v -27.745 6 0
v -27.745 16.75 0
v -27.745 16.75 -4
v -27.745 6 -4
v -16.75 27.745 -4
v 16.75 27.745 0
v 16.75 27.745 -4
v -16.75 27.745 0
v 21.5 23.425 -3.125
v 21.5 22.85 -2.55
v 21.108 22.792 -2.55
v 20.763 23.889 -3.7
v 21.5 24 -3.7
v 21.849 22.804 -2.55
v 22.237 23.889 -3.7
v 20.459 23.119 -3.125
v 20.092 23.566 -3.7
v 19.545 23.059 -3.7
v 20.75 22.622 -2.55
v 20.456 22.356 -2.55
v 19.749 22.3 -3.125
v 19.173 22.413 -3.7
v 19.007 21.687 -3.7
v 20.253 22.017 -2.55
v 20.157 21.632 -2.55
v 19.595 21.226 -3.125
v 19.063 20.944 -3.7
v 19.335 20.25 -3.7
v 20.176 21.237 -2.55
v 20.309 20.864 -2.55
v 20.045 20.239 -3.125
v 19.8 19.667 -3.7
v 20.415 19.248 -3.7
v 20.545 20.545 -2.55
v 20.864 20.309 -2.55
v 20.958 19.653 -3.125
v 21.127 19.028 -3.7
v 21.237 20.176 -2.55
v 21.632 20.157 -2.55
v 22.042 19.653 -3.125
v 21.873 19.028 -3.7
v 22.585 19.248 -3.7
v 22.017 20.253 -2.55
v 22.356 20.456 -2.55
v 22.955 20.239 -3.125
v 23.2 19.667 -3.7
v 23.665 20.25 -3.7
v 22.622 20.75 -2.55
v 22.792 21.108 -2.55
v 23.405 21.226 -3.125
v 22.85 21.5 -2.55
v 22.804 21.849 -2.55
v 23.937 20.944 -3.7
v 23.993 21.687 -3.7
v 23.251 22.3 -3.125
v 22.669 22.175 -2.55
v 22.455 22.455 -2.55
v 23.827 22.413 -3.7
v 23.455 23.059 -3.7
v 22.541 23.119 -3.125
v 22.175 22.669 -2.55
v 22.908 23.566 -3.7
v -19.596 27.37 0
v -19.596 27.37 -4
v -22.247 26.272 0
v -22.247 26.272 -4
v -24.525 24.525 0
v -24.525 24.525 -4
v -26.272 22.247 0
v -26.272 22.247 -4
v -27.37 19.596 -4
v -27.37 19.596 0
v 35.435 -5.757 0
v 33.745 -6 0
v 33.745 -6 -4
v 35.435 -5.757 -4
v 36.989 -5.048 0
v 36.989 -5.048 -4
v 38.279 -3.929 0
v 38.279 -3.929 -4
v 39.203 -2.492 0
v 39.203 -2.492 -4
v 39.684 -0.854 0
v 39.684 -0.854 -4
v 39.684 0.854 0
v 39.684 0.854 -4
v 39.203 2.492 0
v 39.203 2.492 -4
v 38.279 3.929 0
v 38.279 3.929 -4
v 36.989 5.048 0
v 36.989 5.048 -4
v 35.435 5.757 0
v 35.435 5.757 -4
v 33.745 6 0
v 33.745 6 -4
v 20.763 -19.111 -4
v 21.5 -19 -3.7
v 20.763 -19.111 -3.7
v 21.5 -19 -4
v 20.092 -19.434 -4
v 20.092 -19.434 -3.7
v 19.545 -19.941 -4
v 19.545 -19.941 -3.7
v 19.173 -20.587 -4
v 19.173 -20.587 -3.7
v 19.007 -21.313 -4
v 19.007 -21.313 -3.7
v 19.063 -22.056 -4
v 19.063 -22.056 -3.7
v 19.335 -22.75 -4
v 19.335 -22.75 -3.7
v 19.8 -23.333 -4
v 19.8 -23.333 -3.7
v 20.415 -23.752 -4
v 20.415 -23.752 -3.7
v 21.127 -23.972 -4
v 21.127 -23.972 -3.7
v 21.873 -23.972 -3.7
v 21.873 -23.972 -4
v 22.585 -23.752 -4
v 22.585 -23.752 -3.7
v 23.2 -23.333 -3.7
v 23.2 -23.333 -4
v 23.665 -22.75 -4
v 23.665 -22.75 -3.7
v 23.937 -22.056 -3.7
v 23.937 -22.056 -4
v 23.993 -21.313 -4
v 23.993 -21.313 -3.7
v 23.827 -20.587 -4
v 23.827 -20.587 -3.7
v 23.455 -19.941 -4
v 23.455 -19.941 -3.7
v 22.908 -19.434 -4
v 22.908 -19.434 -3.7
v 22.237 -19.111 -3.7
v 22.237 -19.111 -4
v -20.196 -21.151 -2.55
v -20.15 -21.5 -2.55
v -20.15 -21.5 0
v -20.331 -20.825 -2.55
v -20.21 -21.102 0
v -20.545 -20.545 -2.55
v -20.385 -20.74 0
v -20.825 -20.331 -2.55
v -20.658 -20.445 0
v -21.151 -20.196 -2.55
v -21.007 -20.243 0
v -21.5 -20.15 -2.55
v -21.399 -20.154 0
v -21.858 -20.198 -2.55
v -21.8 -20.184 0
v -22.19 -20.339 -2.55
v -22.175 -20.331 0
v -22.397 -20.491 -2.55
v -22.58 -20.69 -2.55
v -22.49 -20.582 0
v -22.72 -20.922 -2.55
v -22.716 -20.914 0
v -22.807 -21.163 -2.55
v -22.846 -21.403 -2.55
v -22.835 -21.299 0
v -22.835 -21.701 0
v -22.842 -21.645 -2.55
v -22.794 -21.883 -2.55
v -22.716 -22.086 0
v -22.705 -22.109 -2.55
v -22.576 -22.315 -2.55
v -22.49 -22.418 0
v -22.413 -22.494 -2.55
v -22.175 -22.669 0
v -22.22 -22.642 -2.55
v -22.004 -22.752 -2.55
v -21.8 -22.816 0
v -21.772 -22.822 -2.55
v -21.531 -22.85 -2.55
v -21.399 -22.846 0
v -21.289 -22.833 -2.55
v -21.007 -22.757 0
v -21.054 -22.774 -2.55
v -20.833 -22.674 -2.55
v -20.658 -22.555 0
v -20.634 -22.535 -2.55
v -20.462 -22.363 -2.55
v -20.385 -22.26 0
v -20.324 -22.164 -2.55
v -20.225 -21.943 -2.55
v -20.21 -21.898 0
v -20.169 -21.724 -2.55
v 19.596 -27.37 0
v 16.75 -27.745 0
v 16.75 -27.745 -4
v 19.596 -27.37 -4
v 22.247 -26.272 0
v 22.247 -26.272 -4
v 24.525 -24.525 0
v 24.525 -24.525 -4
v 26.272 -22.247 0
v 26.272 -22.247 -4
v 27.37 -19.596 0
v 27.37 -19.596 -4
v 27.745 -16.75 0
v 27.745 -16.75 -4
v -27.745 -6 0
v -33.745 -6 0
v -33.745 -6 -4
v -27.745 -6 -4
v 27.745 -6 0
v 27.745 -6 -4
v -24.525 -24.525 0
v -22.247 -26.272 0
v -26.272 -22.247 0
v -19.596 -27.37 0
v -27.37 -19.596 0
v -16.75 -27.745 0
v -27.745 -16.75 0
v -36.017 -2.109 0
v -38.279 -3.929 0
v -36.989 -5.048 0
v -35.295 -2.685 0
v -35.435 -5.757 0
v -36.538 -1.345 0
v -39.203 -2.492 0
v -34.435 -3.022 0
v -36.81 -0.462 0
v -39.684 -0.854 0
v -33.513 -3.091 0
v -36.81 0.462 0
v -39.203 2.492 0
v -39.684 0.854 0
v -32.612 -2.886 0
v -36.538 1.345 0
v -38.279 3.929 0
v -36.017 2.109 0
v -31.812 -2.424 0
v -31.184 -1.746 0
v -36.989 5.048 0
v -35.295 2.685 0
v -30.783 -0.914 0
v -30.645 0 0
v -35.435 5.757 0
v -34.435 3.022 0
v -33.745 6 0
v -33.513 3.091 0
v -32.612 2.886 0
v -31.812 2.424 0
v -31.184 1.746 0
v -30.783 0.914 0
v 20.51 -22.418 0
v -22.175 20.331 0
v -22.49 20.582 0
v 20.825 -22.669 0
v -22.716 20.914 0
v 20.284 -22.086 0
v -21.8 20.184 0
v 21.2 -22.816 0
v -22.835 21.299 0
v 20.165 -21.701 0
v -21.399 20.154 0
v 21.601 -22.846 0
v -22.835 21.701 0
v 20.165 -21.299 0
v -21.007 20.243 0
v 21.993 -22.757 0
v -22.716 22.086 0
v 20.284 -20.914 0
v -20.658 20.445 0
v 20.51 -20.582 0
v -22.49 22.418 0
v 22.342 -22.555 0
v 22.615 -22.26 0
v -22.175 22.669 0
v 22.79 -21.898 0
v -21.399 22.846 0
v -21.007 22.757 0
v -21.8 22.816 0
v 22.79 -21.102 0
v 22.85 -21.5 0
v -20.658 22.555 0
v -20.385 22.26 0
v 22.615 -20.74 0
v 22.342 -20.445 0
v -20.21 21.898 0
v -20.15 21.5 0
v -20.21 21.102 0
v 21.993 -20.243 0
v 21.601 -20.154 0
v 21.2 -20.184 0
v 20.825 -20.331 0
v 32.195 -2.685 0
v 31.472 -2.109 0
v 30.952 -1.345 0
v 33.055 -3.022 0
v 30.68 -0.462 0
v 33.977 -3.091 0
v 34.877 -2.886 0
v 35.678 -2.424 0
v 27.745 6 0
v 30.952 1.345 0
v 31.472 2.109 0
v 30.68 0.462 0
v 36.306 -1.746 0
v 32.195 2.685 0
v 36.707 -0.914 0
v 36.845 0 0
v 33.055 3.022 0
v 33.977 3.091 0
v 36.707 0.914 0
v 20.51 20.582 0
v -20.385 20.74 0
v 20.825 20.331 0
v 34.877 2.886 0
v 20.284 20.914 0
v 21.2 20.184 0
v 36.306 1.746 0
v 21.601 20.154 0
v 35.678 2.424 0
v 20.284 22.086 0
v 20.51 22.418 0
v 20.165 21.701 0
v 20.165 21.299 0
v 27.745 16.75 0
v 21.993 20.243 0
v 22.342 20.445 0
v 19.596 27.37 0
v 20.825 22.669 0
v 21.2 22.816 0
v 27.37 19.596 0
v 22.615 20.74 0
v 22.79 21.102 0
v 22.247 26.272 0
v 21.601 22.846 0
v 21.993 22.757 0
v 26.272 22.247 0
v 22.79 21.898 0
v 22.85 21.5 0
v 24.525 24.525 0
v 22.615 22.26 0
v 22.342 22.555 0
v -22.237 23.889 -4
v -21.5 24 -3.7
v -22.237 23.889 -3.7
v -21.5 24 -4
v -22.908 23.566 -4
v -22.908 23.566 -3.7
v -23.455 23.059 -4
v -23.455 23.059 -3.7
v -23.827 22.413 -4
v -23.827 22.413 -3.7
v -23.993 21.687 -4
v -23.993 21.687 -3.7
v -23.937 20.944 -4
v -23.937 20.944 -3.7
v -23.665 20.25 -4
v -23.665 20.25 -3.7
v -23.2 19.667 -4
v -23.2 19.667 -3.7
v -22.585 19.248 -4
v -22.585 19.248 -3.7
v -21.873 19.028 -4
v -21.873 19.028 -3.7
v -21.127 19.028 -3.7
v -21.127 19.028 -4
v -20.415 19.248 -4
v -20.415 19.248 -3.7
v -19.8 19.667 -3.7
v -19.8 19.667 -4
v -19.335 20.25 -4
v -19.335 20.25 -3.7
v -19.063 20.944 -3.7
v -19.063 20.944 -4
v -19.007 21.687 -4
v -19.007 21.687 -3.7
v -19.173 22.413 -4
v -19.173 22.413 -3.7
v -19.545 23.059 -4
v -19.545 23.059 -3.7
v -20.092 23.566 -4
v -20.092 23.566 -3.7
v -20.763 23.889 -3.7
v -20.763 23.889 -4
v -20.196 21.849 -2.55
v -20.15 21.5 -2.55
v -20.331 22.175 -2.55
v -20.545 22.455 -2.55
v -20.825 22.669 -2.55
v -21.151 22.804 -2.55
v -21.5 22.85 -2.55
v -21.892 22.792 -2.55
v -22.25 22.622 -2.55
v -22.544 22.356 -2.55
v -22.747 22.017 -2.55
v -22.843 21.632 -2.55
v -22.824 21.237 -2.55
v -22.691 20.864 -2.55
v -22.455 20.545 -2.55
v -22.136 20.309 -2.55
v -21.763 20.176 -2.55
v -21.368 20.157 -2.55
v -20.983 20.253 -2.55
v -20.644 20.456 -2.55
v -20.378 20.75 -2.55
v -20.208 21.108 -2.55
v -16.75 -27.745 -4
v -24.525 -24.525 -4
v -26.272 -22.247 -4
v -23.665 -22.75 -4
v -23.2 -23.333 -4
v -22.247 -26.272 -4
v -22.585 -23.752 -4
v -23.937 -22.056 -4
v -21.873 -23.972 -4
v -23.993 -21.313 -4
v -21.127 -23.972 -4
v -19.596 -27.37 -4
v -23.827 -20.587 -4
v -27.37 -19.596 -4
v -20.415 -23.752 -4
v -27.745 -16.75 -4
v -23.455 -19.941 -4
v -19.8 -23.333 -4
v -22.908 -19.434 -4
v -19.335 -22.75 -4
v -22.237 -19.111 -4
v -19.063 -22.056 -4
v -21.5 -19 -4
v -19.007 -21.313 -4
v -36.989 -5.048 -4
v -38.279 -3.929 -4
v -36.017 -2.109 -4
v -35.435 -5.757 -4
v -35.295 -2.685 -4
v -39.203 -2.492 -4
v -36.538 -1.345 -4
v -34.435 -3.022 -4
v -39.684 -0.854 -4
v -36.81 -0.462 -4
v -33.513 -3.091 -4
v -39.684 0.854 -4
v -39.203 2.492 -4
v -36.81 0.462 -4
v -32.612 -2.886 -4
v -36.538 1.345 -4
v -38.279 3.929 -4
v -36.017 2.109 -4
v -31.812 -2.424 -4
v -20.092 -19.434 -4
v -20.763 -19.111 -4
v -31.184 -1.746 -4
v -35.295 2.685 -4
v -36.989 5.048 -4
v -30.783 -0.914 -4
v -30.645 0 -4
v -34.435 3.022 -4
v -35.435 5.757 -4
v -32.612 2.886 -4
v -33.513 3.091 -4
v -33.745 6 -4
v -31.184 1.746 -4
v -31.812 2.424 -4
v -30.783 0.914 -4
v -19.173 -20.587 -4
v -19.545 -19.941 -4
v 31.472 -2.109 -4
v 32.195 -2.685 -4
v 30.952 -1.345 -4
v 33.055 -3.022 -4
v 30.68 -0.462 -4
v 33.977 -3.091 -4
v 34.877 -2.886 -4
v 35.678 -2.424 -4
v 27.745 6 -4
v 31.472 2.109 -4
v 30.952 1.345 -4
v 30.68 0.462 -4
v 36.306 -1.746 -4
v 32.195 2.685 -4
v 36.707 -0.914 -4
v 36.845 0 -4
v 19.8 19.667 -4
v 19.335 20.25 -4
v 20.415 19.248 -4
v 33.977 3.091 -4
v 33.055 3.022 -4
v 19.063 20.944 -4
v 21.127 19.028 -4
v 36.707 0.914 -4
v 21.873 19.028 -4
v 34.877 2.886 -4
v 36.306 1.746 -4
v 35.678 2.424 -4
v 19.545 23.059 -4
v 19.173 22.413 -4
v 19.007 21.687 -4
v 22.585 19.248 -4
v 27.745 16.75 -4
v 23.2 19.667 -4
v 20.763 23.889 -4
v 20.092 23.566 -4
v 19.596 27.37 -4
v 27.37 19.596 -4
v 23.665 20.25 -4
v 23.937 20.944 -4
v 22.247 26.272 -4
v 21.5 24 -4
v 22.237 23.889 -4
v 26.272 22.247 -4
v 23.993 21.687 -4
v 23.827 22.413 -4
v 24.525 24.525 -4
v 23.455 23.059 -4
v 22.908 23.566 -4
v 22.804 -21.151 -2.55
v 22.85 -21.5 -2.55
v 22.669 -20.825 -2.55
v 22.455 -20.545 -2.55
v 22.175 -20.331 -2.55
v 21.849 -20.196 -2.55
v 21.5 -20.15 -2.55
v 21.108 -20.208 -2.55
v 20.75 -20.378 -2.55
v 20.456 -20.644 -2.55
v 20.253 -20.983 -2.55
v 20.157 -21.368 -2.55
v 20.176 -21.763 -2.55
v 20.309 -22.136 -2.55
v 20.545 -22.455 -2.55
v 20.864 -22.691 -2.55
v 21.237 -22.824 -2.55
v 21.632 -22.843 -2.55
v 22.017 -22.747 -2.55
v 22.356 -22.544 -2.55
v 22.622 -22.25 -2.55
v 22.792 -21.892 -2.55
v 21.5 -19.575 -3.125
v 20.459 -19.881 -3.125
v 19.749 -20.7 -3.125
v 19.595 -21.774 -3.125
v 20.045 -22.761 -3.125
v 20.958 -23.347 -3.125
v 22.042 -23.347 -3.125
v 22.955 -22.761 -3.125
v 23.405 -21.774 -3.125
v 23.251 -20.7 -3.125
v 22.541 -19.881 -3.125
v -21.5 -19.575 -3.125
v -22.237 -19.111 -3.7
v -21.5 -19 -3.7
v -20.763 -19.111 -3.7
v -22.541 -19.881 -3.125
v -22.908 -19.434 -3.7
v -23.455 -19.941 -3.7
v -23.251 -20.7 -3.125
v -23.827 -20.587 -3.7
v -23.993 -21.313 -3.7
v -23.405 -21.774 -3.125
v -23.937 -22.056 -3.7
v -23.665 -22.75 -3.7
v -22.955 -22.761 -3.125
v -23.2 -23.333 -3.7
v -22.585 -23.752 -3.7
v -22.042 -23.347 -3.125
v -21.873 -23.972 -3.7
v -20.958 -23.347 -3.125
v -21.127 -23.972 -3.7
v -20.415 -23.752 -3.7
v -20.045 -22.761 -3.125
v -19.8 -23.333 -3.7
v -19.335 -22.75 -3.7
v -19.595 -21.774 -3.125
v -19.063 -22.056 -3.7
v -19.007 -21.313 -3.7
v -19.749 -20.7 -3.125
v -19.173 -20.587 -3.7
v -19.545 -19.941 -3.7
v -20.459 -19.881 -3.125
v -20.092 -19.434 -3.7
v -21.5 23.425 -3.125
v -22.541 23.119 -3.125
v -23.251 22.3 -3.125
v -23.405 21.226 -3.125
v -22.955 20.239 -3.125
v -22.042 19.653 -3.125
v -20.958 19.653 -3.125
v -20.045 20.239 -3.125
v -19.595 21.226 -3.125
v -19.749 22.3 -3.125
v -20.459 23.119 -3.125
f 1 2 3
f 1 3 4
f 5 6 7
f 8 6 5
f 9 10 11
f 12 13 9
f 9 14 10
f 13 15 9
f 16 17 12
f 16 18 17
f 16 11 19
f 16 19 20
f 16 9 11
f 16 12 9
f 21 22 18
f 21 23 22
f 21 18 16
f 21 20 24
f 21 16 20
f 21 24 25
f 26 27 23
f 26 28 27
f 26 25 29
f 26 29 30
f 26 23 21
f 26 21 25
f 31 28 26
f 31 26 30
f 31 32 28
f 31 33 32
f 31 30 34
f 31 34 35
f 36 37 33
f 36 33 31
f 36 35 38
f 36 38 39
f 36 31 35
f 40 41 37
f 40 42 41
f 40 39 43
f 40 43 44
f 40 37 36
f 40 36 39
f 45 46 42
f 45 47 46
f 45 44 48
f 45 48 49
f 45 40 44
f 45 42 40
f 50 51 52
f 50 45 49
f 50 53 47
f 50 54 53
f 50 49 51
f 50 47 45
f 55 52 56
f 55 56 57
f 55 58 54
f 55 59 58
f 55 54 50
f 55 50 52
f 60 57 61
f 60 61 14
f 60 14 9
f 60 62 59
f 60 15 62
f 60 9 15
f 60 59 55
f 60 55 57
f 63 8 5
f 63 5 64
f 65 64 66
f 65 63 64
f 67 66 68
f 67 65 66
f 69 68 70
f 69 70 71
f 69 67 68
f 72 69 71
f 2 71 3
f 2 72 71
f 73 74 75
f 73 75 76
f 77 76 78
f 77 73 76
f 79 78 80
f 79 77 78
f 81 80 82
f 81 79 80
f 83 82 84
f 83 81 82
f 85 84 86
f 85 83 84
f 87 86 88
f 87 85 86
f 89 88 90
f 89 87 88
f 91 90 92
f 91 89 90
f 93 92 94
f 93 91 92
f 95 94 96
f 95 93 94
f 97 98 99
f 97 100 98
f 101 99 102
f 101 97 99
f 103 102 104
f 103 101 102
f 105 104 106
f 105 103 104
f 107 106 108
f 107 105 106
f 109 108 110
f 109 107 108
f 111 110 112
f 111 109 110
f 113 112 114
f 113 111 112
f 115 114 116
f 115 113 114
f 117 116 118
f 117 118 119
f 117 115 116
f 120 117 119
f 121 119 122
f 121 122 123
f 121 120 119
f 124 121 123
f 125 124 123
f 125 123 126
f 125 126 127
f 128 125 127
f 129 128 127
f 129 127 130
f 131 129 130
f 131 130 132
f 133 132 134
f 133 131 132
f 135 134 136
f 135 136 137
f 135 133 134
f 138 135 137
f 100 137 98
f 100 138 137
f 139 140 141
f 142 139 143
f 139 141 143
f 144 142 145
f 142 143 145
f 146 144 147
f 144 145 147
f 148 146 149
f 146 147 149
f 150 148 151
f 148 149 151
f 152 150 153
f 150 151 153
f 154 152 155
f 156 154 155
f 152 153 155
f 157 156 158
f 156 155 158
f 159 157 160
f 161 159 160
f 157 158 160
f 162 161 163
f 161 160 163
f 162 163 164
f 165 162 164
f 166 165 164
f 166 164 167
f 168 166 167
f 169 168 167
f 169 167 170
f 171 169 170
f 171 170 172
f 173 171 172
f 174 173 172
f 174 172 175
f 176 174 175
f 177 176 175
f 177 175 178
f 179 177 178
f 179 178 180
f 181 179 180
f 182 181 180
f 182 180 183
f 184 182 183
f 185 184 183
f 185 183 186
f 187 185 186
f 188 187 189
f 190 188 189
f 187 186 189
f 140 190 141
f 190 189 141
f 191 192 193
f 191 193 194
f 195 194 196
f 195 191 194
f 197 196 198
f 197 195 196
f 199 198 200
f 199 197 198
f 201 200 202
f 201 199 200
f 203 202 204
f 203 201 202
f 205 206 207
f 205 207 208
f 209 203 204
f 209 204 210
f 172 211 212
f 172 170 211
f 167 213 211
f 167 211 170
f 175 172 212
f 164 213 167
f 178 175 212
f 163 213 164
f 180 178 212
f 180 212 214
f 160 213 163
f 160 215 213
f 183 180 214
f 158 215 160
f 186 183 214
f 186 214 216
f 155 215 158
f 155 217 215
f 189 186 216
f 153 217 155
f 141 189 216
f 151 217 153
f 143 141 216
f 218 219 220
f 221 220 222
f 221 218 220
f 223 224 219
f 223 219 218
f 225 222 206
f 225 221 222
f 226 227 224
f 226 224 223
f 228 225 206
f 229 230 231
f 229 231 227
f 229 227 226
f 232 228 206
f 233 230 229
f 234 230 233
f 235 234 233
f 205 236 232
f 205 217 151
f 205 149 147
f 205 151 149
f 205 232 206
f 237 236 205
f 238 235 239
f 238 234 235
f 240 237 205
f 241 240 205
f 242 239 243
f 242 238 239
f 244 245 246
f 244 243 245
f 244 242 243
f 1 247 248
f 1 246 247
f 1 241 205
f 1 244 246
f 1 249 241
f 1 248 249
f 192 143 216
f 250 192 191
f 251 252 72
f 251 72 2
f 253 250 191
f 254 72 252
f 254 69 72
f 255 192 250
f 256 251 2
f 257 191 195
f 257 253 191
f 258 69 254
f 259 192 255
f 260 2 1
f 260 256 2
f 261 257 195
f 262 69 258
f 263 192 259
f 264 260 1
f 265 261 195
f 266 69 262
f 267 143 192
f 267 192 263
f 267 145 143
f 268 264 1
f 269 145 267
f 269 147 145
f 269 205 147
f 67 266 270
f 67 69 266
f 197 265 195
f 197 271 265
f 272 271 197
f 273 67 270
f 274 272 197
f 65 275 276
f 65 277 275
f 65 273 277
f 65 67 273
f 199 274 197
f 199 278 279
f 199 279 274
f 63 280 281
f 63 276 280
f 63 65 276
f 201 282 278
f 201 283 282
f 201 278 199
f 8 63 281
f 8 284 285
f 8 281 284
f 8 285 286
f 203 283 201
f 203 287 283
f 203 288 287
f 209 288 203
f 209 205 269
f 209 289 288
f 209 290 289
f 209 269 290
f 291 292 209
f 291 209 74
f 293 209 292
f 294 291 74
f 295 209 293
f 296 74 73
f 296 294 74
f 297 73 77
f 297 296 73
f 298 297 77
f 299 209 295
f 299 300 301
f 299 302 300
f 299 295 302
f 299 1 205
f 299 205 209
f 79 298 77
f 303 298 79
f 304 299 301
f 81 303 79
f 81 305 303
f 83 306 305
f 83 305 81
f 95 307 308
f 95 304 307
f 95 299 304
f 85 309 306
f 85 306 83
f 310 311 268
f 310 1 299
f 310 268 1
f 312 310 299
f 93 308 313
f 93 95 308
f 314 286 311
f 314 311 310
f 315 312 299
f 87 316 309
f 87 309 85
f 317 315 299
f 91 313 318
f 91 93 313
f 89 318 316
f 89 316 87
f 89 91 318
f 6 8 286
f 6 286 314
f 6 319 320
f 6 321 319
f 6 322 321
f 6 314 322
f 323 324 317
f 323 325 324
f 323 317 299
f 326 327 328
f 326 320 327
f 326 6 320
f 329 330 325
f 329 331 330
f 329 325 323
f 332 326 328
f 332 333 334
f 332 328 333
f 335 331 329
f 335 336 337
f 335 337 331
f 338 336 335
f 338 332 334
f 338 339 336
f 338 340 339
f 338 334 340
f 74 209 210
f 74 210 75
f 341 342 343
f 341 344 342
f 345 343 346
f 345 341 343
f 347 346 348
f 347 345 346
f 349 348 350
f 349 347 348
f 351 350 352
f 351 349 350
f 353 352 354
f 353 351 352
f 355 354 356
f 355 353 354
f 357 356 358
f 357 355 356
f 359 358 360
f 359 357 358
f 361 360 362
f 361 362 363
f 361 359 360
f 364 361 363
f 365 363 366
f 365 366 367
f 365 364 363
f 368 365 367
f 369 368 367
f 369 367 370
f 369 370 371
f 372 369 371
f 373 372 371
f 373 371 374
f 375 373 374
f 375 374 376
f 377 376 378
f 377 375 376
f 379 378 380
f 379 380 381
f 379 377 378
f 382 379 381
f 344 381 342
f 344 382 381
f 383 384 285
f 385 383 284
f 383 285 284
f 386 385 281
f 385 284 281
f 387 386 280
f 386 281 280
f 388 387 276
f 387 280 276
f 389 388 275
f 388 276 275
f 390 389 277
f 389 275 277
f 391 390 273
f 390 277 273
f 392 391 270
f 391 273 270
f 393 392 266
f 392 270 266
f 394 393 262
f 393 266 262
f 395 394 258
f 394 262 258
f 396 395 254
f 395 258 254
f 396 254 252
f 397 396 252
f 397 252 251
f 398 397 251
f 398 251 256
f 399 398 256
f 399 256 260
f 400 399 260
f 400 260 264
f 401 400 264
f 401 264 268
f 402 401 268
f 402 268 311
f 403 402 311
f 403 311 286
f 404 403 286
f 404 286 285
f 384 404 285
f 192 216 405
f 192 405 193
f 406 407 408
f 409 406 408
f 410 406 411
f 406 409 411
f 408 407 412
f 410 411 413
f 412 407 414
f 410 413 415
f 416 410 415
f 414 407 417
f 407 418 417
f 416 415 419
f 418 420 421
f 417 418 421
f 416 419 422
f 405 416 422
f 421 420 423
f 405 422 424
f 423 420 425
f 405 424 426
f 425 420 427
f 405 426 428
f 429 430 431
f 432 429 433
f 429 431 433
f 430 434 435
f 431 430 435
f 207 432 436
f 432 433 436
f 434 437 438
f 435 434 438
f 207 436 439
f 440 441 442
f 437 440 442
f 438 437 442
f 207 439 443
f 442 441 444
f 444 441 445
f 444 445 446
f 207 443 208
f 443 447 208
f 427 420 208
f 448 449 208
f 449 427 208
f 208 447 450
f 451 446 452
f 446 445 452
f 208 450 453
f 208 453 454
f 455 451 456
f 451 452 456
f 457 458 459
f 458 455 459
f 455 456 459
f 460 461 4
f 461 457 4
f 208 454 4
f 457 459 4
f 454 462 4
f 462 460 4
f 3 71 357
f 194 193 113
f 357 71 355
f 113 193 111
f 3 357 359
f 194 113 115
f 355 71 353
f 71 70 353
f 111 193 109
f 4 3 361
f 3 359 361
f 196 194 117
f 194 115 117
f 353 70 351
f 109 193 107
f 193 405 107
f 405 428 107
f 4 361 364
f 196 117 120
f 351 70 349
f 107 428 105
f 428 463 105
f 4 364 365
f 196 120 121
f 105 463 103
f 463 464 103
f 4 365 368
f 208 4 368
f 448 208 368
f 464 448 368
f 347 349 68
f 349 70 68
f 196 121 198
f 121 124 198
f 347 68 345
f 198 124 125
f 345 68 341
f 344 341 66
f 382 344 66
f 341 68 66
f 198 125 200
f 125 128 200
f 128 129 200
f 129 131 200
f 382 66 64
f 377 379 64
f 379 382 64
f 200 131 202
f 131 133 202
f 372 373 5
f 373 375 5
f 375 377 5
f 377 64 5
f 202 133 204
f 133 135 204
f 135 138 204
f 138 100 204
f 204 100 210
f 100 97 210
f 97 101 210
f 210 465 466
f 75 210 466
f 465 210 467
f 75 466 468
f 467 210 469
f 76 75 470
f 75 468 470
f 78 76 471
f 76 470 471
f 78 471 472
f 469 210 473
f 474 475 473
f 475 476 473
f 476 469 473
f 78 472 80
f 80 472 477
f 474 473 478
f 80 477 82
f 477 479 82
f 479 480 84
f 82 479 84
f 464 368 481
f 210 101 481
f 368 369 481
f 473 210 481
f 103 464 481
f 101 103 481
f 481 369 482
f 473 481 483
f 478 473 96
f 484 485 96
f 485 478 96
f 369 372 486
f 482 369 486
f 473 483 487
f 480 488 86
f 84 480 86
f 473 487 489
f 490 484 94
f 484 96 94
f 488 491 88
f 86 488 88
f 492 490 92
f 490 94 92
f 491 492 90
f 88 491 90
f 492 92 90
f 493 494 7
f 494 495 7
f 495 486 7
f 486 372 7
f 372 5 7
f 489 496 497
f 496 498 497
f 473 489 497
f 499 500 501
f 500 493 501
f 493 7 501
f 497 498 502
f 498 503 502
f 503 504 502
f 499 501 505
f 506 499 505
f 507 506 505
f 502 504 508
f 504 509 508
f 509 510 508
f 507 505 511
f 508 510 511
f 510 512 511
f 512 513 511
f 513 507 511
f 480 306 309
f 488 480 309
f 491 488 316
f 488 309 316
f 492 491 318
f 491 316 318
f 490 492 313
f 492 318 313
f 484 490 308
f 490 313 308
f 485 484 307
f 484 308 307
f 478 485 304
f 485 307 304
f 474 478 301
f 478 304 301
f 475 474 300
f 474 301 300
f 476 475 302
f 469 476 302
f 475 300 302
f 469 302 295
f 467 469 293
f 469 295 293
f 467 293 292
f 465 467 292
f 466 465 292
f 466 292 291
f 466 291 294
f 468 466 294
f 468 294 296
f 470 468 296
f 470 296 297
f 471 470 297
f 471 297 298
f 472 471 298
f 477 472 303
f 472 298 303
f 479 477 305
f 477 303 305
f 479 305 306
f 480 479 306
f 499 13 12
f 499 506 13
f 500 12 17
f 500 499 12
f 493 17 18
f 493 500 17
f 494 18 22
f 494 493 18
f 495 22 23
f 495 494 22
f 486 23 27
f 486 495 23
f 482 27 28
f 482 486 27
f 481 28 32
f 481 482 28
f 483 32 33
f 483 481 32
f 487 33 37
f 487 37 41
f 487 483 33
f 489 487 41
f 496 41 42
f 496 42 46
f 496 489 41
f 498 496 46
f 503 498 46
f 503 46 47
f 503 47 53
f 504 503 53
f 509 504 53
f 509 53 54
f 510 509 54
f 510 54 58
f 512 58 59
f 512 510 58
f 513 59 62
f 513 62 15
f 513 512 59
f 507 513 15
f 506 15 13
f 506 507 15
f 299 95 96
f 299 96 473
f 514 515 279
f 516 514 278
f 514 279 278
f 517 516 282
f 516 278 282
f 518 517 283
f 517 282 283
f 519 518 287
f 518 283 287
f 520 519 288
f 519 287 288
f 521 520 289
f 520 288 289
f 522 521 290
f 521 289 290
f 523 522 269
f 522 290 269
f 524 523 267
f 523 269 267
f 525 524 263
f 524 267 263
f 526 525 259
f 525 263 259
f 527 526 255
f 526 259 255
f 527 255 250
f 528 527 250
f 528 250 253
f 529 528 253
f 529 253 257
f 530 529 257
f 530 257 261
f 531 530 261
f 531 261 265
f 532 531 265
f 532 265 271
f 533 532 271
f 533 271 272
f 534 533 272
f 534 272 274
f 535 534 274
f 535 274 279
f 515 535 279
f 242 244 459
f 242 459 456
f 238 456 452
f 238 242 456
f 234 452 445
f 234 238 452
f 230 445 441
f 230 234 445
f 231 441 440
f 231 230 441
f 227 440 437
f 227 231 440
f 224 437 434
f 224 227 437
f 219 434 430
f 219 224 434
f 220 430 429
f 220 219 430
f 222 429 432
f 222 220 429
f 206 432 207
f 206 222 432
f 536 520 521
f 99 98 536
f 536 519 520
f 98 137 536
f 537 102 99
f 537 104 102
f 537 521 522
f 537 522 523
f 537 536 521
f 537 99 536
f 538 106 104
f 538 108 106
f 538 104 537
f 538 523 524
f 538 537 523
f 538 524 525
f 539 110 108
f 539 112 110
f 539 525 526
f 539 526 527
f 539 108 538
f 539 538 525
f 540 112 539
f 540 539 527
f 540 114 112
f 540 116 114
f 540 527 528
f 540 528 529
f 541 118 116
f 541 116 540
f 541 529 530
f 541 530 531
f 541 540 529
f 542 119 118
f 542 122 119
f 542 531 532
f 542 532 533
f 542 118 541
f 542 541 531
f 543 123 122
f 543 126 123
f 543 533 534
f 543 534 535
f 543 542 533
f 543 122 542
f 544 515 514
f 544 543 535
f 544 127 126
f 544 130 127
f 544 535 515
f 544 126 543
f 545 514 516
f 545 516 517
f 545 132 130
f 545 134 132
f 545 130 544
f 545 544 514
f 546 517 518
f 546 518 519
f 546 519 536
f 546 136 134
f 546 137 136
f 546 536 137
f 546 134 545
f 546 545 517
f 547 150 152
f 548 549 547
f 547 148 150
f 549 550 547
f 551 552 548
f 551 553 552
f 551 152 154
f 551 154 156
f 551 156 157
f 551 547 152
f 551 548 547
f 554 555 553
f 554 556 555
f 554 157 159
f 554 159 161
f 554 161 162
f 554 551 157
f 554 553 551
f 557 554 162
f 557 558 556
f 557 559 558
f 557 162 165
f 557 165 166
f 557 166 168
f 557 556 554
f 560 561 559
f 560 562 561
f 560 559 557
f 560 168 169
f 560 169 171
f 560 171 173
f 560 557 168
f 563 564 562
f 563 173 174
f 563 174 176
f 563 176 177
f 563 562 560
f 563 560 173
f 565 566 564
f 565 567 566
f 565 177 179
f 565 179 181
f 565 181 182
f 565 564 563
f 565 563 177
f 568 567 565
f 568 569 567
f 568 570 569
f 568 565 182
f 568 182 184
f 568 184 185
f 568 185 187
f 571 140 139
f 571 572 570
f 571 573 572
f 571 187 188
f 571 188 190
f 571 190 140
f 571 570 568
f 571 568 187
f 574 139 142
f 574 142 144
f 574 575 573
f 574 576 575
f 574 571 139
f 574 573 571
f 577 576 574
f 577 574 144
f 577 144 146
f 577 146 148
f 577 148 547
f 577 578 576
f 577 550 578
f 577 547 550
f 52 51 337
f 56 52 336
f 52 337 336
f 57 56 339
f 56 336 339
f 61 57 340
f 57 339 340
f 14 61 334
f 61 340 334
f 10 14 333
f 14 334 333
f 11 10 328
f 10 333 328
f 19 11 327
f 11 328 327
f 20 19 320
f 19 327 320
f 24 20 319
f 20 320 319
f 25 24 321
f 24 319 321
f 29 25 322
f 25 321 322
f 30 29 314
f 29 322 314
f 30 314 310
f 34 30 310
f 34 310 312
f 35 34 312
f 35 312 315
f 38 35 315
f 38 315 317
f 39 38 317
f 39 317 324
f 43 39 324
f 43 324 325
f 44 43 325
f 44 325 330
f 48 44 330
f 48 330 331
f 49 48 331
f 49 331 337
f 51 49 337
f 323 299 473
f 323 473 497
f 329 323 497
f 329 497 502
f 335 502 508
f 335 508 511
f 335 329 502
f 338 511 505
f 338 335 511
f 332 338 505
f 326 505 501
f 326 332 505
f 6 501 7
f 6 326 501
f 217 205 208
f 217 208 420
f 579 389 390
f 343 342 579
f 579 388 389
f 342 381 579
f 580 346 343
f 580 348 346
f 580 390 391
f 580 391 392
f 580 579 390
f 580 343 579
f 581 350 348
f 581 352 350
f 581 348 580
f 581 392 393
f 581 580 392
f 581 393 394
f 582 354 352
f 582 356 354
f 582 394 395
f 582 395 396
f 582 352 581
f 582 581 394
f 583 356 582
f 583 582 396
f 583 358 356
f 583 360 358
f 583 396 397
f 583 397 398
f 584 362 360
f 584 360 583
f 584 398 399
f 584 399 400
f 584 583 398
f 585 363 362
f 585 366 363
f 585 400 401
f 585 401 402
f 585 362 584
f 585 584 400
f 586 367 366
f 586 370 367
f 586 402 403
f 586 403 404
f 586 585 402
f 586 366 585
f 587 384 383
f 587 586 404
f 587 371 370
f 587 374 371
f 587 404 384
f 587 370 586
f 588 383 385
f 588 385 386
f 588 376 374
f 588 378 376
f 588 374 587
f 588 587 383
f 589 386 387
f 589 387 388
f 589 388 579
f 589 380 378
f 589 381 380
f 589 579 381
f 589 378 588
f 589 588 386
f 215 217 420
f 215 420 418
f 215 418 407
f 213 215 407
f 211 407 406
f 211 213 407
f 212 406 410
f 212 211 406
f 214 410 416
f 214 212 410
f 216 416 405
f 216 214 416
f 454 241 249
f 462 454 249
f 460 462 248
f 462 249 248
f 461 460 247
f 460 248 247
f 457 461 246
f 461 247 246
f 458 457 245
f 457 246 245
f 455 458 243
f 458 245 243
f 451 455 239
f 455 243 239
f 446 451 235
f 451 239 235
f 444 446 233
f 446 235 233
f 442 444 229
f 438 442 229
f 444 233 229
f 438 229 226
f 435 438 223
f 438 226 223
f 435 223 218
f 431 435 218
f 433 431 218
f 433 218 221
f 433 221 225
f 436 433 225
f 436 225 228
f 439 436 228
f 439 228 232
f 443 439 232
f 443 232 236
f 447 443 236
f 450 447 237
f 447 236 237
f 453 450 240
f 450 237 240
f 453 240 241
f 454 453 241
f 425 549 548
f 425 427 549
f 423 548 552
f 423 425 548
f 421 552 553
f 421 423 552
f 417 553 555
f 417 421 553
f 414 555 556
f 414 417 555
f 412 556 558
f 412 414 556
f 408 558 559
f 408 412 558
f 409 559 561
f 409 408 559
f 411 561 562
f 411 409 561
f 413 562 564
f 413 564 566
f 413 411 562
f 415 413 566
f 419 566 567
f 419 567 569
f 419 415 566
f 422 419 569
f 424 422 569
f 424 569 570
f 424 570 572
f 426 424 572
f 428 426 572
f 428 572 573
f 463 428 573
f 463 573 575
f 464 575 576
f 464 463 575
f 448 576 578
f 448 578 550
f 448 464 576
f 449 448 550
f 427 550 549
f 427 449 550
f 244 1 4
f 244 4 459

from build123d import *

# Parameters (mm, degrees)
SKETCH1_R                                      = 1.35
SKETCH1_R_2                                    = 6
SKETCH1_R_3                                    = 3.1
BOSS_EXTRUDE1_DEPTH                            = 4
CSK_FOR_M2_5_FLAT_HEAD_MACHINE_SCREW1_AT_COUNT = 2
CSK_FOR_M2_5_FLAT_HEAD_MACHINE_SCREW1_AT_PITCH = 43
CSK_FOR_M2_5_FLAT_HEAD_MACHINE_SCREW_2_COUNT   = 2
CSK_FOR_M2_5_FLAT_HEAD_MACHINE_SCREW_2_PITCH   = 60.811183182
CSK_FOR_M2_5_FLAT_HEAD_MACHINE_SCREW_3_COUNT   = 2
CSK_FOR_M2_5_FLAT_HEAD_MACHINE_SCREW_3_PITCH   = 43


with BuildPart() as part:
    # Sketch1 → Boss-Extrude1 (new body)
    with BuildSketch(Plane.XY):
        with BuildLine():
            Line((-27.744938631, 6), (27.744938631, 6))
            Line((27.744938631, 6), (27.744938631, 16.75))
            ThreePointArc((27.744938631, 16.75), (24.524595568, 24.52459576), (16.749999729, 27.744938631))
            Line((16.749999729, 27.744938631), (-16.75, 27.744938631))
            ThreePointArc((-16.75, 27.744938631), (-24.524595664, 24.524595664), (-27.744938631, 16.75))
            Line((-27.744938631, 16.75), (-27.744938631, 6))
        make_face()
        with Locations((-21.5, 21.5)):
            Circle(SKETCH1_R, mode=Mode.SUBTRACT)
        with Locations((21.5, 21.5)):
            Circle(SKETCH1_R, mode=Mode.SUBTRACT)
        Polygon((-27.744938631, -6), (27.744938631, -6), (27.744938631, 0), (27.744938631, 6), (-27.744938631, 6), (-27.744938631, 0), align=None)
        with BuildLine():
            Line((-16.749999529, -27.744938631), (16.75, -27.744938631))
            ThreePointArc((16.75, -27.744938631), (24.524595836, -24.524595492), (27.744938631, -16.749999513))
            Line((27.744938631, -16.749999513), (27.744938631, -6))
            Line((27.744938631, -6), (-27.744938631, -6))
            Line((-27.744938631, -6), (-27.744938631, -16.75))
            ThreePointArc((-27.744938631, -16.75), (-24.524595498, -24.524595831), (-16.749999529, -27.744938631))
        make_face()
        with Locations((-21.5, -21.5)):
            Circle(SKETCH1_R, mode=Mode.SUBTRACT)
        with Locations((21.5, -21.5)):
            Circle(SKETCH1_R, mode=Mode.SUBTRACT)
        with BuildLine():
            Line((-33.744938608, -6), (-27.744938631, -6))
            Line((-27.744938631, -6), (-27.744938631, 0))
            ThreePointArc((-27.744938631, 0), (-29.502297935, -4.242640679), (-33.744938608, -6))
        make_face()
        with BuildLine():
            ThreePointArc((-33.744938605, 6), (-29.502297934, 4.242640678), (-27.744938631, 0))
            Line((-27.744938631, 0), (-27.744938631, 6))
            Line((-27.744938631, 6), (-33.744938605, 6))
        make_face()
        with Locations((-33.744938631, 0)):
            Circle(SKETCH1_R_2)
        with Locations((-33.744938631, 0)):
            Circle(SKETCH1_R_3, mode=Mode.SUBTRACT)
        with BuildLine():
            Line((27.744938631, 6), (27.744938631, 0))
            ThreePointArc((27.744938631, 0), (29.502297943, 4.242640687), (33.744938631, 6))
            Line((33.744938631, 6), (27.744938631, 6))
        make_face()
        with BuildLine():
            Line((27.744938631, 0), (27.744938631, -6))
            Line((27.744938631, -6), (33.744938631, -6))
            ThreePointArc((33.744938631, -6), (29.502297943, -4.242640687), (27.744938631, 0))
        make_face()
        with Locations((33.744938631, 0)):
            Circle(SKETCH1_R_2)
        with Locations((33.744938631, 0)):
            Circle(SKETCH1_R_3, mode=Mode.SUBTRACT)
    extrude(amount=-BOSS_EXTRUDE1_DEPTH)

    # Sketch3 → CSK for M2.5 Flat Head Machine Screw1 (revolve, cut)
    with BuildSketch(Plane(origin=(21.5, 21.5, -4), x_dir=(0, 1, 0), z_dir=(1, 0, 0))):
        Polygon((0, 0), (0, 4), (1.25, 4), (1.25, 1.55), (2.5, 0.3), (2.5, 0), align=None)
    csk_for_m2_5_flat_head_machine_screw1 = revolve(axis=Axis((21.5, 21.5, -10.35), (0, 0, 1)), mode=Mode.SUBTRACT)

    # CSK for M2.5 Flat Head Machine Screw1 at: CSK for M2.5 Flat Head Machine Screw1 ×2
    with Locations(*[(-i * CSK_FOR_M2_5_FLAT_HEAD_MACHINE_SCREW1_AT_PITCH, 0, 0) for i in range(1, CSK_FOR_M2_5_FLAT_HEAD_MACHINE_SCREW1_AT_COUNT)]):
        add(csk_for_m2_5_flat_head_machine_screw1, mode=Mode.SUBTRACT)

    # CSK for M2.5 Flat Head Machine Screw 2: CSK for M2.5 Flat Head Machine Screw1 ×2
    with Locations(*[Vector(-0.707106781, -0.707106781, 0) * (i * CSK_FOR_M2_5_FLAT_HEAD_MACHINE_SCREW_2_PITCH) for i in range(1, CSK_FOR_M2_5_FLAT_HEAD_MACHINE_SCREW_2_COUNT)]):
        add(csk_for_m2_5_flat_head_machine_screw1, mode=Mode.SUBTRACT)

    # CSK for M2.5 Flat Head Machine Screw 3: CSK for M2.5 Flat Head Machine Screw1 ×2
    with Locations(*[(0, -i * CSK_FOR_M2_5_FLAT_HEAD_MACHINE_SCREW_3_PITCH, 0) for i in range(1, CSK_FOR_M2_5_FLAT_HEAD_MACHINE_SCREW_3_COUNT)]):
        add(csk_for_m2_5_flat_head_machine_screw1, mode=Mode.SUBTRACT)


solid = part.part
